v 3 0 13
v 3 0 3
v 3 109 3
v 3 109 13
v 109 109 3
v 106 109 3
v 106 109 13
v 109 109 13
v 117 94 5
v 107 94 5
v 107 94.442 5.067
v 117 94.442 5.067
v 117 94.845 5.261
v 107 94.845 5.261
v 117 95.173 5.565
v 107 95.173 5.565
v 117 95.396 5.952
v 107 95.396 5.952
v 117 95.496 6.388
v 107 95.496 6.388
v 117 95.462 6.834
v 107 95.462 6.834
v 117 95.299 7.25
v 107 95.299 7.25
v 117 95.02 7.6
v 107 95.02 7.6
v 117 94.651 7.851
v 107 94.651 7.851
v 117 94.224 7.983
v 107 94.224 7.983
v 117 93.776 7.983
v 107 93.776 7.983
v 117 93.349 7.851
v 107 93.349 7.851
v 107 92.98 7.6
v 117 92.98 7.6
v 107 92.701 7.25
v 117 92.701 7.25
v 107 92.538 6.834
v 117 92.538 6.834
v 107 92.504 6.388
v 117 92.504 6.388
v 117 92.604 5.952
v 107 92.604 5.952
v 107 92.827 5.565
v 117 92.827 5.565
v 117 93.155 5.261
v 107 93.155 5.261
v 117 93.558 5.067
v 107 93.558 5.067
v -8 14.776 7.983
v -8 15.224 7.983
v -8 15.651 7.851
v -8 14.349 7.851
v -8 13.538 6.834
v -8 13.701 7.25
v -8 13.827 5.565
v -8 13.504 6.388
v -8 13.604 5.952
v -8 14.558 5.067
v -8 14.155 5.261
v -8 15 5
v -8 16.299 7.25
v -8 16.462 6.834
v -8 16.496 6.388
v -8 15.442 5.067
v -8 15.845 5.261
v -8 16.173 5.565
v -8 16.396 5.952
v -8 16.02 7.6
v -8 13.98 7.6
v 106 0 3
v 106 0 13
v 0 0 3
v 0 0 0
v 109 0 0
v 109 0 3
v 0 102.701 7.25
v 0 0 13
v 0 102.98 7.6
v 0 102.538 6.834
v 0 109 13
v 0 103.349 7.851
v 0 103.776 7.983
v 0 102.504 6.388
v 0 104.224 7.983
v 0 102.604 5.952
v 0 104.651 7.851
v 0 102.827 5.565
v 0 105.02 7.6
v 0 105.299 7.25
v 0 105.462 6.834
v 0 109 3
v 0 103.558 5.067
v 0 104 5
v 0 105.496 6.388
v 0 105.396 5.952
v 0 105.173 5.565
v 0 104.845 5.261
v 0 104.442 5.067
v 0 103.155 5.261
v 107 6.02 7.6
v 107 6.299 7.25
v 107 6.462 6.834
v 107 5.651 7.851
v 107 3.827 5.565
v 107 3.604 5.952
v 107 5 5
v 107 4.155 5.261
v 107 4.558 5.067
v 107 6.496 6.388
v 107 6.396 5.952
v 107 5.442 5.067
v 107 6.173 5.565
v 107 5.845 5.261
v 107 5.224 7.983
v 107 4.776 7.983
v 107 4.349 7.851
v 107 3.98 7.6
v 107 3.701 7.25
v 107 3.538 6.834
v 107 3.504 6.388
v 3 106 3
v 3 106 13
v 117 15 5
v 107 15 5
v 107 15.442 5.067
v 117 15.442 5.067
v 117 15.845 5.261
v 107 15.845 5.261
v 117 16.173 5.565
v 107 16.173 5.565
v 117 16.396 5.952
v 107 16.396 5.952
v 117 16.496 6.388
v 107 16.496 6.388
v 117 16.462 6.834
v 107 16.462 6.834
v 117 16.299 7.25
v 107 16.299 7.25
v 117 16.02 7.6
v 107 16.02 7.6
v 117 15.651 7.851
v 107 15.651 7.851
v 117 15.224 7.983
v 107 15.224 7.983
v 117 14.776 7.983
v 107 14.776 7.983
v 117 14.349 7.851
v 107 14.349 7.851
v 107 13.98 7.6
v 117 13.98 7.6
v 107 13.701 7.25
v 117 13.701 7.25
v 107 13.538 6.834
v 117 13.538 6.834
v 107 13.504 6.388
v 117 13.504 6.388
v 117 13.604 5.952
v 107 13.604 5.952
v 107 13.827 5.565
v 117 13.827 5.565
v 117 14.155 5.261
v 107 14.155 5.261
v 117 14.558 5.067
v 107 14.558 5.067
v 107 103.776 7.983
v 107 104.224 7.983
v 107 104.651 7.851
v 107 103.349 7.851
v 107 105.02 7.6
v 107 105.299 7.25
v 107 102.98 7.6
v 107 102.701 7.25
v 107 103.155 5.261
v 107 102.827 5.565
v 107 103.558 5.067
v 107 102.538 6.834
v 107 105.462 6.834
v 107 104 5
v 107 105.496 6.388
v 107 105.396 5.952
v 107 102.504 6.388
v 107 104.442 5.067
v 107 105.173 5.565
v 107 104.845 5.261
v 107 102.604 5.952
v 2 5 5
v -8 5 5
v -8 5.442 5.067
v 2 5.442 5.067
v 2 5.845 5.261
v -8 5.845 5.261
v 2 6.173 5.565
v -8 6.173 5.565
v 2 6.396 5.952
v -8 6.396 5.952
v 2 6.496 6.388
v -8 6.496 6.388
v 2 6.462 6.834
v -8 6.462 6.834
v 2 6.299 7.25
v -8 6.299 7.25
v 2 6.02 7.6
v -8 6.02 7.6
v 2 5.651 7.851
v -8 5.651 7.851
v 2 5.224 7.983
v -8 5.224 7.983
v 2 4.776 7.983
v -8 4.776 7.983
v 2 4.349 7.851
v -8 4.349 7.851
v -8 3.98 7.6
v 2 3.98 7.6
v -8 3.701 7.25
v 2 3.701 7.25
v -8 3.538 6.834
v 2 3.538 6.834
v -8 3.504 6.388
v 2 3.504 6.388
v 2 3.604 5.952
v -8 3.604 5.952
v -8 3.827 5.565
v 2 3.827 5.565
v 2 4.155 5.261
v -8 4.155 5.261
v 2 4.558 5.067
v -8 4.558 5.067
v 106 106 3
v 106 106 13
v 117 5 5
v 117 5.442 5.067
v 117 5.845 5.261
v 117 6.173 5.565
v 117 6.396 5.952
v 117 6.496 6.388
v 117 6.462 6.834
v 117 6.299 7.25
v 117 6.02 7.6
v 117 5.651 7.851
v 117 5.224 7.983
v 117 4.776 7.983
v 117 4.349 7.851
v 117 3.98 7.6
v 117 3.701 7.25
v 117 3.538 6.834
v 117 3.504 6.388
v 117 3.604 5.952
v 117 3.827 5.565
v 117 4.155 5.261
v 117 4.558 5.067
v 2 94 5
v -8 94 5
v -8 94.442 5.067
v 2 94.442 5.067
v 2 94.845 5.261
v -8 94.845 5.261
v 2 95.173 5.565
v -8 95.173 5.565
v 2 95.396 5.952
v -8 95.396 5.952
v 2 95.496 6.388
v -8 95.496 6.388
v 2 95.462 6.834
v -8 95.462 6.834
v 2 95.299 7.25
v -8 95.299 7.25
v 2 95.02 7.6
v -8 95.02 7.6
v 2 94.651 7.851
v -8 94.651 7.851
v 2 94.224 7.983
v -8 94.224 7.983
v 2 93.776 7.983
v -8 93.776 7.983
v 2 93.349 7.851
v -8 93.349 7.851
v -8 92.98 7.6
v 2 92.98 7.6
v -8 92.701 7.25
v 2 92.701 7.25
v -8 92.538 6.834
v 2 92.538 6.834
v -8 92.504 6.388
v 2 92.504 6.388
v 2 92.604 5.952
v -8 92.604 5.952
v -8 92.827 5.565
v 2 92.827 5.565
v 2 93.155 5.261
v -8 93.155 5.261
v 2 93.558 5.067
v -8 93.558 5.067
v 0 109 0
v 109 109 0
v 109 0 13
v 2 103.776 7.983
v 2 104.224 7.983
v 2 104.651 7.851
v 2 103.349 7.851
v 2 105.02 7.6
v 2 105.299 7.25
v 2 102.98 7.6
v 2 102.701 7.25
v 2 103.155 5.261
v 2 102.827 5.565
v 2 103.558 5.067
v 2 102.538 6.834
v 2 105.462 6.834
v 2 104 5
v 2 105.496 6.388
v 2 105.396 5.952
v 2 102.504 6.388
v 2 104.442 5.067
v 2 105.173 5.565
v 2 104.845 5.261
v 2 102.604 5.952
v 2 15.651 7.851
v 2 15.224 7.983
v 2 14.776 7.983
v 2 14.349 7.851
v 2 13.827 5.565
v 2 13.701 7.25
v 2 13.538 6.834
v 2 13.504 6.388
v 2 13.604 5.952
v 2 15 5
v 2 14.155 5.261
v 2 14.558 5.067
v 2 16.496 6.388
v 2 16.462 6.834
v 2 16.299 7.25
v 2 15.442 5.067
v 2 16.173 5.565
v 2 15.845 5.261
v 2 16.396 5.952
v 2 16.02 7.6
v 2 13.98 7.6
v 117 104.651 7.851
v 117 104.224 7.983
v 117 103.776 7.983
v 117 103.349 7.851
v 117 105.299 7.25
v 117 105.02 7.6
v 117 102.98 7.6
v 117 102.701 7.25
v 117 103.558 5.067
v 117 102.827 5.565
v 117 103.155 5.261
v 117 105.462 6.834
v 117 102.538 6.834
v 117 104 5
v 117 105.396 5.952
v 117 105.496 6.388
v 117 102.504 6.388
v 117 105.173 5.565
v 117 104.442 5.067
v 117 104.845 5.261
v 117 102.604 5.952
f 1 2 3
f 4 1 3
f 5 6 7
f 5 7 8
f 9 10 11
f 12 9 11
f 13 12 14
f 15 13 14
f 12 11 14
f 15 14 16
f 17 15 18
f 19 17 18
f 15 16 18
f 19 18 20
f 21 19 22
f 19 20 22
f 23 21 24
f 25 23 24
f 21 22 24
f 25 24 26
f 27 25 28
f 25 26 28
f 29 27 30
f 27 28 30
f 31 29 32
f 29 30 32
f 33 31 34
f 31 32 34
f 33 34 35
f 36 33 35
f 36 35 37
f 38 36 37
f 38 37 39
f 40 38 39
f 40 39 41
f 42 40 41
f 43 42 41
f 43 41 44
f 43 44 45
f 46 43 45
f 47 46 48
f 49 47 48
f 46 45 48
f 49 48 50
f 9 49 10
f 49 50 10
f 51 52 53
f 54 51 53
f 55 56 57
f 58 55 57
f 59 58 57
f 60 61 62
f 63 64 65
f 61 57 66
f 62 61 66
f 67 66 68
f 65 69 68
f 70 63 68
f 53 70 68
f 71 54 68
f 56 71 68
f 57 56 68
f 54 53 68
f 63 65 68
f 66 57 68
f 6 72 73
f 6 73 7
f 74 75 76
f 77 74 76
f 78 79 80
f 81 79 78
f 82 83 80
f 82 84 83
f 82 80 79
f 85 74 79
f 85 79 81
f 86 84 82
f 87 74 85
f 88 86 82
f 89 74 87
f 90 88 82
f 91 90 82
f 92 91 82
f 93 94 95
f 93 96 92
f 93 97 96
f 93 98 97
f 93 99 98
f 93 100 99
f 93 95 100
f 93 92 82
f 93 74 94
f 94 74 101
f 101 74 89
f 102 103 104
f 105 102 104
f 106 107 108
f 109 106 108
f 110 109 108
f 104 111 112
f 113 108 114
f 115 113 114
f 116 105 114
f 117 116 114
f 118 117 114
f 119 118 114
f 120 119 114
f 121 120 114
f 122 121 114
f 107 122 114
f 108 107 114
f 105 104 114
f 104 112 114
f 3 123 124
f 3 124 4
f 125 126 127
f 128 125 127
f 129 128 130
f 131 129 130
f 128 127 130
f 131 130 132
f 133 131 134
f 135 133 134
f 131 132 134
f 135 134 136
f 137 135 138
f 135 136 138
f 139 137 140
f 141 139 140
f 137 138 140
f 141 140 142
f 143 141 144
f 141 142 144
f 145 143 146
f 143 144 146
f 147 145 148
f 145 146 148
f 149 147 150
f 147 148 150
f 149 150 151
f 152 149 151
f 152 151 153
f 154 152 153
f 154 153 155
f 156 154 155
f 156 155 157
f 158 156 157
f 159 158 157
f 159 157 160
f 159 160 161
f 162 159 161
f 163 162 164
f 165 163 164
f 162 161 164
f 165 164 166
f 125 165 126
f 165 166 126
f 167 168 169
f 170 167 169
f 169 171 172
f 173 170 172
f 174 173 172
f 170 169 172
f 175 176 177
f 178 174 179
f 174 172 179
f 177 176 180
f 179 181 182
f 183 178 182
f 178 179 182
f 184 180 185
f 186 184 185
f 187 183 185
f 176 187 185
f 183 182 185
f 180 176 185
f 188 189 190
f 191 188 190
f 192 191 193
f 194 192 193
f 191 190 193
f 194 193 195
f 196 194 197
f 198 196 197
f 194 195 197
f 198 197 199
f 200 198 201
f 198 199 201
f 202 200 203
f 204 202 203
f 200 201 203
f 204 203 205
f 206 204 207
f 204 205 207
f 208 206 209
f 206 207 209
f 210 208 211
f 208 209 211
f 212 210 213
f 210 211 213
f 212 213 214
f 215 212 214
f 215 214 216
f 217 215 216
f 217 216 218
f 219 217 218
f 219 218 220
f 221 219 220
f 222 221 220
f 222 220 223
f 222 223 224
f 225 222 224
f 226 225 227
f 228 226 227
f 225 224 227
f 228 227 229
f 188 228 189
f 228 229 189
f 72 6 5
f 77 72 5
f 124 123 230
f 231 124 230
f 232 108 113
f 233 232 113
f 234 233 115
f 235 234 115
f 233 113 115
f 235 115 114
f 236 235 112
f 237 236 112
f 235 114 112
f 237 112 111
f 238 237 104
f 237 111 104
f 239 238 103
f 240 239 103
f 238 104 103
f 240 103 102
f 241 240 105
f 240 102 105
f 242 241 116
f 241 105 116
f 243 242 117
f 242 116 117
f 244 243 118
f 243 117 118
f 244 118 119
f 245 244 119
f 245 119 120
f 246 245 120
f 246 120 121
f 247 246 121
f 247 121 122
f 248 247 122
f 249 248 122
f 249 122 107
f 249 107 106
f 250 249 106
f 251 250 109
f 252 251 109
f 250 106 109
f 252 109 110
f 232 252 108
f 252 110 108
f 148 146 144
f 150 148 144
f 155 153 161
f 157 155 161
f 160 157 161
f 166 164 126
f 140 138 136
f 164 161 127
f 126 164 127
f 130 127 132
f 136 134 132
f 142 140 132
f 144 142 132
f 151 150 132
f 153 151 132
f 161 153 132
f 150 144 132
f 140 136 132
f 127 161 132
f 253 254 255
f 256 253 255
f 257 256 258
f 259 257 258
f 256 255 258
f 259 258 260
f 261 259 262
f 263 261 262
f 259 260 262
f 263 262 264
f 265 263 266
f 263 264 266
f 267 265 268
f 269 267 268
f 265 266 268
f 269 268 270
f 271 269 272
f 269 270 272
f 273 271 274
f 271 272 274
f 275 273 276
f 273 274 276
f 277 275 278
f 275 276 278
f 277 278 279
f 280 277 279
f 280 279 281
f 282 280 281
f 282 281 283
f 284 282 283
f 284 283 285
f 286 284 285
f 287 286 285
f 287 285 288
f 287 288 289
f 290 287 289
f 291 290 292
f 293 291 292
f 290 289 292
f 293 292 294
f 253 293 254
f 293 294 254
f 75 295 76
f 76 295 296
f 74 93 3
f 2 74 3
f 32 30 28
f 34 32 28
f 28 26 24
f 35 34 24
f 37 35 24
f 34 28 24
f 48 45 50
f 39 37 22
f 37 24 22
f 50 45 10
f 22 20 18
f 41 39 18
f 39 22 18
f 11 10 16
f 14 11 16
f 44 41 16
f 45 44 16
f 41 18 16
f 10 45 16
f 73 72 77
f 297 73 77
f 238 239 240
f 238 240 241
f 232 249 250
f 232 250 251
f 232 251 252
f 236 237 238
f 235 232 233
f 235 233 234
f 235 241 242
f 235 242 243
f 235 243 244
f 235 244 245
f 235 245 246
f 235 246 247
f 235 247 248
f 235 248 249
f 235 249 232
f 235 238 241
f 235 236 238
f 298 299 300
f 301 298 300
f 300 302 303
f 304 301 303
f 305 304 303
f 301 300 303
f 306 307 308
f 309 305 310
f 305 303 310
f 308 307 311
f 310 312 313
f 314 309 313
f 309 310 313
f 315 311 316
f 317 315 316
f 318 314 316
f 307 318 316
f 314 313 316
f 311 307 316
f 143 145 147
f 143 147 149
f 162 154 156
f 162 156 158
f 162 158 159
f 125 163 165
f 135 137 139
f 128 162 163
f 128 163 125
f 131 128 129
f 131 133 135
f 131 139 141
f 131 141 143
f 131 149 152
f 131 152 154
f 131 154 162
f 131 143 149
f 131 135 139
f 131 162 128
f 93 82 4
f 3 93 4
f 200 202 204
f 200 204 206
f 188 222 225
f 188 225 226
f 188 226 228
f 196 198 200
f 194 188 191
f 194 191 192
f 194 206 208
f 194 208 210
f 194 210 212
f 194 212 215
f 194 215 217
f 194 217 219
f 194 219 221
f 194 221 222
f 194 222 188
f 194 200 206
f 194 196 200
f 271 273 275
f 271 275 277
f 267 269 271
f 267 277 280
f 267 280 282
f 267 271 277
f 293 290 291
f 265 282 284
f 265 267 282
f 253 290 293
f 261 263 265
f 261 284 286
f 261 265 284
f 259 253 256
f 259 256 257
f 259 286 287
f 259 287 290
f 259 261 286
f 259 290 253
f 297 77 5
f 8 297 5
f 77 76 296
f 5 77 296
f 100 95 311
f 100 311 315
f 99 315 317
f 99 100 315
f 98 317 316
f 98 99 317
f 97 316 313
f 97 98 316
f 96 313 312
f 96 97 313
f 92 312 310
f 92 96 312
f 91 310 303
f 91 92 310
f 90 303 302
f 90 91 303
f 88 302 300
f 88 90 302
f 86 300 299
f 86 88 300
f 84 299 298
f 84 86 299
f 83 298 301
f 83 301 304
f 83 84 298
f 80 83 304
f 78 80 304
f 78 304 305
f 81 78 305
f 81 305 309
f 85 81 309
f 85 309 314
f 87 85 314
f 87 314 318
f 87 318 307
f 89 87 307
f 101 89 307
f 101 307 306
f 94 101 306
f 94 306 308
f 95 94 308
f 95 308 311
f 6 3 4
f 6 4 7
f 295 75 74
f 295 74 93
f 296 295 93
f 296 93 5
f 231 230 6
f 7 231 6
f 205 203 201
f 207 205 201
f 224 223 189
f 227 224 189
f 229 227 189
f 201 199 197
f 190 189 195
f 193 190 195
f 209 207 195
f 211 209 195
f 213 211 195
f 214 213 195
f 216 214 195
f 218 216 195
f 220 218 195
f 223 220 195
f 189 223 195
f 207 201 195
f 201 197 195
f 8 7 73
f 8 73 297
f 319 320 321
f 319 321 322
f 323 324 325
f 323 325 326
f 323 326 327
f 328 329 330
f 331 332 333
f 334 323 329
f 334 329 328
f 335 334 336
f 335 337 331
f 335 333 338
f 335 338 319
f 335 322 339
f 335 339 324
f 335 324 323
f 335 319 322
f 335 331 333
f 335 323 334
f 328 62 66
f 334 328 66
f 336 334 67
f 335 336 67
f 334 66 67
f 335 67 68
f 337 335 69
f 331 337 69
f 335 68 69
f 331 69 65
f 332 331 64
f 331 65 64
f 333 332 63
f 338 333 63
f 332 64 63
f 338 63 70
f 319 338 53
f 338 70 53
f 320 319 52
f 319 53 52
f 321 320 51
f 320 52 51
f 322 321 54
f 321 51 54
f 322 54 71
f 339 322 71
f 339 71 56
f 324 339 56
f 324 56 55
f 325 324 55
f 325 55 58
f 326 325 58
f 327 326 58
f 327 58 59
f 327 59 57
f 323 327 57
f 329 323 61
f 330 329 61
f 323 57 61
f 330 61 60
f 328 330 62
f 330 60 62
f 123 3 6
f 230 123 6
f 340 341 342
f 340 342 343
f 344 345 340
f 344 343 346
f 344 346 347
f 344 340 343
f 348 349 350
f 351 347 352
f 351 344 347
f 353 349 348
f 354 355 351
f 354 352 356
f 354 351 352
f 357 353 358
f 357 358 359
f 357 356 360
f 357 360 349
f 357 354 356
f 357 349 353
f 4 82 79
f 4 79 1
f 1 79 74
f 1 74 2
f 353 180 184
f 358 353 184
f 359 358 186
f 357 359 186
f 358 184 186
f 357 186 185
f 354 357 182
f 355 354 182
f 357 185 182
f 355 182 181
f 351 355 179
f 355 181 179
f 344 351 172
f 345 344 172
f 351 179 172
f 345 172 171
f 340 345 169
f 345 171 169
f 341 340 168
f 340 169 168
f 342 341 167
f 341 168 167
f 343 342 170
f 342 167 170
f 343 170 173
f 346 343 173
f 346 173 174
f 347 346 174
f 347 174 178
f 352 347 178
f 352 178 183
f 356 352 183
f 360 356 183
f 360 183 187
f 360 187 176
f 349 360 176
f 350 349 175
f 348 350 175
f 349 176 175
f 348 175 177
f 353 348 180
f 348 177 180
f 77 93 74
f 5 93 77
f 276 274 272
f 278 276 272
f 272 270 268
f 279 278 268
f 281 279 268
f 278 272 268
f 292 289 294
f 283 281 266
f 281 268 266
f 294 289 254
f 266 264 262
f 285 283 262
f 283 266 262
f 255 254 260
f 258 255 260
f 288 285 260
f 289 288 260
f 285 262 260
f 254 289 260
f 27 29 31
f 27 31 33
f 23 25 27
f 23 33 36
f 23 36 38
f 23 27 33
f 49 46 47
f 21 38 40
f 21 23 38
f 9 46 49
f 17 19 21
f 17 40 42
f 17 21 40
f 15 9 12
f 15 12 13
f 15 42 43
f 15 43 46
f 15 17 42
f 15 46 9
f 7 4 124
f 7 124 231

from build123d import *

# Parameters (mm, degrees)
BOX_W             = 109
BOX_H             = 109
BOX_DEPTH         = 3
BOX002_W          = 3
BOX002_H          = 109
BOX002_DEPTH      = 10
BOX003_W          = 103
BOX003_H          = 3
BOX003_DEPTH      = 10
CYLINDER_R        = 1.5
CYLINDER_DEPTH    = 10
CYLINDER002_R     = 1.5
CYLINDER002_DEPTH = 10
CYLINDER003_R     = 1.5
CYLINDER003_DEPTH = 10
CYLINDER004_R     = 1.5
CYLINDER004_DEPTH = 10
CYLINDER005_R     = 1.5
CYLINDER005_DEPTH = 10
CYLINDER006_R     = 1.5
CYLINDER006_DEPTH = 10
CYLINDER007_R     = 1.5
CYLINDER007_DEPTH = 10
CYLINDER001_R     = 1.5
CYLINDER001_DEPTH = 10
BOX001_W          = 3
BOX001_H          = 109
BOX001_DEPTH      = 10


with BuildPart() as floor:
    # Box → Box (new body)
    with BuildSketch(Plane.XY):
        with Locations((54.5, 54.5)):
            Rectangle(BOX_W, BOX_H)
    extrude(amount=BOX_DEPTH)


with BuildPart() as lwall:
    # Box002 → Box002 (new body)
    with BuildSketch(Plane(origin=(106, 0, 3), x_dir=(1, 0, 0), z_dir=(0, 0, 1))):
        with Locations((1.5, 54.5)):
            Rectangle(BOX002_W, BOX002_H)
    extrude(amount=BOX002_DEPTH)


with BuildPart() as back:
    # Box003 → Box003 (new body)
    with BuildSketch(Plane(origin=(3, 106, 3), x_dir=(1, 0, 0), z_dir=(0, 0, 1))):
        with Locations((51.5, 1.5)):
            Rectangle(BOX003_W, BOX003_H)
    extrude(amount=BOX003_DEPTH)


with BuildPart() as hole:
    # Cylinder → Cylinder (new body)
    with BuildSketch(Plane(origin=(-8, 5, 6.5), x_dir=(0, 0, -1), z_dir=(1, 0, 0))):
        Circle(CYLINDER_R)
    extrude(amount=CYLINDER_DEPTH)


with BuildPart() as hole002:
    # Cylinder002 → Cylinder002 (new body)
    with BuildSketch(Plane(origin=(-8, 15, 6.5), x_dir=(0, 0, -1), z_dir=(1, 0, 0))):
        Circle(CYLINDER002_R)
    extrude(amount=CYLINDER002_DEPTH)


with BuildPart() as hole003:
    # Cylinder003 → Cylinder003 (new body)
    with BuildSketch(Plane(origin=(-8, 94, 6.5), x_dir=(0, 0, -1), z_dir=(1, 0, 0))):
        Circle(CYLINDER003_R)
    extrude(amount=CYLINDER003_DEPTH)


with BuildPart() as hole004:
    # Cylinder004 → Cylinder004 (new body)
    with BuildSketch(Plane(origin=(107, 104, 6.5), x_dir=(0, 0, -1), z_dir=(1, 0, 0))):
        Circle(CYLINDER004_R)
    extrude(amount=CYLINDER004_DEPTH)


with BuildPart() as hole005:
    # Cylinder005 → Cylinder005 (new body)
    with BuildSketch(Plane(origin=(107, 94, 6.5), x_dir=(0, 0, -1), z_dir=(1, 0, 0))):
        Circle(CYLINDER005_R)
    extrude(amount=CYLINDER005_DEPTH)


with BuildPart() as hole006:
    # Cylinder006 → Cylinder006 (new body)
    with BuildSketch(Plane(origin=(107, 5, 6.5), x_dir=(0, 0, -1), z_dir=(1, 0, 0))):
        Circle(CYLINDER006_R)
    extrude(amount=CYLINDER006_DEPTH)


with BuildPart() as hole007:
    # Cylinder007 → Cylinder007 (new body)
    with BuildSketch(Plane(origin=(107, 15, 6.5), x_dir=(0, 0, -1), z_dir=(1, 0, 0))):
        Circle(CYLINDER007_R)
    extrude(amount=CYLINDER007_DEPTH)


with BuildPart() as hole001:
    # Cylinder001 → Cylinder001 (new body)
    with BuildSketch(Plane(origin=(-8, 104, 6.5), x_dir=(0, 0, -1), z_dir=(1, 0, 0))):
        Circle(CYLINDER001_R)
    extrude(amount=CYLINDER001_DEPTH)


with BuildPart() as cut:
    # Box001 → Box001 (new body)
    with BuildSketch(Plane.XY.offset(3)):
        with Locations((1.5, 54.5)):
            Rectangle(BOX001_W, BOX001_H)
    extrude(amount=BOX001_DEPTH)

    # Cut: cut Hole001
    add(hole001.part, mode=Mode.SUBTRACT)


solid = Compound([floor.part, lwall.part, back.part, hole.part, hole002.part, hole003.part, hole004.part, hole005.part, hole006.part, hole007.part, cut.part])
